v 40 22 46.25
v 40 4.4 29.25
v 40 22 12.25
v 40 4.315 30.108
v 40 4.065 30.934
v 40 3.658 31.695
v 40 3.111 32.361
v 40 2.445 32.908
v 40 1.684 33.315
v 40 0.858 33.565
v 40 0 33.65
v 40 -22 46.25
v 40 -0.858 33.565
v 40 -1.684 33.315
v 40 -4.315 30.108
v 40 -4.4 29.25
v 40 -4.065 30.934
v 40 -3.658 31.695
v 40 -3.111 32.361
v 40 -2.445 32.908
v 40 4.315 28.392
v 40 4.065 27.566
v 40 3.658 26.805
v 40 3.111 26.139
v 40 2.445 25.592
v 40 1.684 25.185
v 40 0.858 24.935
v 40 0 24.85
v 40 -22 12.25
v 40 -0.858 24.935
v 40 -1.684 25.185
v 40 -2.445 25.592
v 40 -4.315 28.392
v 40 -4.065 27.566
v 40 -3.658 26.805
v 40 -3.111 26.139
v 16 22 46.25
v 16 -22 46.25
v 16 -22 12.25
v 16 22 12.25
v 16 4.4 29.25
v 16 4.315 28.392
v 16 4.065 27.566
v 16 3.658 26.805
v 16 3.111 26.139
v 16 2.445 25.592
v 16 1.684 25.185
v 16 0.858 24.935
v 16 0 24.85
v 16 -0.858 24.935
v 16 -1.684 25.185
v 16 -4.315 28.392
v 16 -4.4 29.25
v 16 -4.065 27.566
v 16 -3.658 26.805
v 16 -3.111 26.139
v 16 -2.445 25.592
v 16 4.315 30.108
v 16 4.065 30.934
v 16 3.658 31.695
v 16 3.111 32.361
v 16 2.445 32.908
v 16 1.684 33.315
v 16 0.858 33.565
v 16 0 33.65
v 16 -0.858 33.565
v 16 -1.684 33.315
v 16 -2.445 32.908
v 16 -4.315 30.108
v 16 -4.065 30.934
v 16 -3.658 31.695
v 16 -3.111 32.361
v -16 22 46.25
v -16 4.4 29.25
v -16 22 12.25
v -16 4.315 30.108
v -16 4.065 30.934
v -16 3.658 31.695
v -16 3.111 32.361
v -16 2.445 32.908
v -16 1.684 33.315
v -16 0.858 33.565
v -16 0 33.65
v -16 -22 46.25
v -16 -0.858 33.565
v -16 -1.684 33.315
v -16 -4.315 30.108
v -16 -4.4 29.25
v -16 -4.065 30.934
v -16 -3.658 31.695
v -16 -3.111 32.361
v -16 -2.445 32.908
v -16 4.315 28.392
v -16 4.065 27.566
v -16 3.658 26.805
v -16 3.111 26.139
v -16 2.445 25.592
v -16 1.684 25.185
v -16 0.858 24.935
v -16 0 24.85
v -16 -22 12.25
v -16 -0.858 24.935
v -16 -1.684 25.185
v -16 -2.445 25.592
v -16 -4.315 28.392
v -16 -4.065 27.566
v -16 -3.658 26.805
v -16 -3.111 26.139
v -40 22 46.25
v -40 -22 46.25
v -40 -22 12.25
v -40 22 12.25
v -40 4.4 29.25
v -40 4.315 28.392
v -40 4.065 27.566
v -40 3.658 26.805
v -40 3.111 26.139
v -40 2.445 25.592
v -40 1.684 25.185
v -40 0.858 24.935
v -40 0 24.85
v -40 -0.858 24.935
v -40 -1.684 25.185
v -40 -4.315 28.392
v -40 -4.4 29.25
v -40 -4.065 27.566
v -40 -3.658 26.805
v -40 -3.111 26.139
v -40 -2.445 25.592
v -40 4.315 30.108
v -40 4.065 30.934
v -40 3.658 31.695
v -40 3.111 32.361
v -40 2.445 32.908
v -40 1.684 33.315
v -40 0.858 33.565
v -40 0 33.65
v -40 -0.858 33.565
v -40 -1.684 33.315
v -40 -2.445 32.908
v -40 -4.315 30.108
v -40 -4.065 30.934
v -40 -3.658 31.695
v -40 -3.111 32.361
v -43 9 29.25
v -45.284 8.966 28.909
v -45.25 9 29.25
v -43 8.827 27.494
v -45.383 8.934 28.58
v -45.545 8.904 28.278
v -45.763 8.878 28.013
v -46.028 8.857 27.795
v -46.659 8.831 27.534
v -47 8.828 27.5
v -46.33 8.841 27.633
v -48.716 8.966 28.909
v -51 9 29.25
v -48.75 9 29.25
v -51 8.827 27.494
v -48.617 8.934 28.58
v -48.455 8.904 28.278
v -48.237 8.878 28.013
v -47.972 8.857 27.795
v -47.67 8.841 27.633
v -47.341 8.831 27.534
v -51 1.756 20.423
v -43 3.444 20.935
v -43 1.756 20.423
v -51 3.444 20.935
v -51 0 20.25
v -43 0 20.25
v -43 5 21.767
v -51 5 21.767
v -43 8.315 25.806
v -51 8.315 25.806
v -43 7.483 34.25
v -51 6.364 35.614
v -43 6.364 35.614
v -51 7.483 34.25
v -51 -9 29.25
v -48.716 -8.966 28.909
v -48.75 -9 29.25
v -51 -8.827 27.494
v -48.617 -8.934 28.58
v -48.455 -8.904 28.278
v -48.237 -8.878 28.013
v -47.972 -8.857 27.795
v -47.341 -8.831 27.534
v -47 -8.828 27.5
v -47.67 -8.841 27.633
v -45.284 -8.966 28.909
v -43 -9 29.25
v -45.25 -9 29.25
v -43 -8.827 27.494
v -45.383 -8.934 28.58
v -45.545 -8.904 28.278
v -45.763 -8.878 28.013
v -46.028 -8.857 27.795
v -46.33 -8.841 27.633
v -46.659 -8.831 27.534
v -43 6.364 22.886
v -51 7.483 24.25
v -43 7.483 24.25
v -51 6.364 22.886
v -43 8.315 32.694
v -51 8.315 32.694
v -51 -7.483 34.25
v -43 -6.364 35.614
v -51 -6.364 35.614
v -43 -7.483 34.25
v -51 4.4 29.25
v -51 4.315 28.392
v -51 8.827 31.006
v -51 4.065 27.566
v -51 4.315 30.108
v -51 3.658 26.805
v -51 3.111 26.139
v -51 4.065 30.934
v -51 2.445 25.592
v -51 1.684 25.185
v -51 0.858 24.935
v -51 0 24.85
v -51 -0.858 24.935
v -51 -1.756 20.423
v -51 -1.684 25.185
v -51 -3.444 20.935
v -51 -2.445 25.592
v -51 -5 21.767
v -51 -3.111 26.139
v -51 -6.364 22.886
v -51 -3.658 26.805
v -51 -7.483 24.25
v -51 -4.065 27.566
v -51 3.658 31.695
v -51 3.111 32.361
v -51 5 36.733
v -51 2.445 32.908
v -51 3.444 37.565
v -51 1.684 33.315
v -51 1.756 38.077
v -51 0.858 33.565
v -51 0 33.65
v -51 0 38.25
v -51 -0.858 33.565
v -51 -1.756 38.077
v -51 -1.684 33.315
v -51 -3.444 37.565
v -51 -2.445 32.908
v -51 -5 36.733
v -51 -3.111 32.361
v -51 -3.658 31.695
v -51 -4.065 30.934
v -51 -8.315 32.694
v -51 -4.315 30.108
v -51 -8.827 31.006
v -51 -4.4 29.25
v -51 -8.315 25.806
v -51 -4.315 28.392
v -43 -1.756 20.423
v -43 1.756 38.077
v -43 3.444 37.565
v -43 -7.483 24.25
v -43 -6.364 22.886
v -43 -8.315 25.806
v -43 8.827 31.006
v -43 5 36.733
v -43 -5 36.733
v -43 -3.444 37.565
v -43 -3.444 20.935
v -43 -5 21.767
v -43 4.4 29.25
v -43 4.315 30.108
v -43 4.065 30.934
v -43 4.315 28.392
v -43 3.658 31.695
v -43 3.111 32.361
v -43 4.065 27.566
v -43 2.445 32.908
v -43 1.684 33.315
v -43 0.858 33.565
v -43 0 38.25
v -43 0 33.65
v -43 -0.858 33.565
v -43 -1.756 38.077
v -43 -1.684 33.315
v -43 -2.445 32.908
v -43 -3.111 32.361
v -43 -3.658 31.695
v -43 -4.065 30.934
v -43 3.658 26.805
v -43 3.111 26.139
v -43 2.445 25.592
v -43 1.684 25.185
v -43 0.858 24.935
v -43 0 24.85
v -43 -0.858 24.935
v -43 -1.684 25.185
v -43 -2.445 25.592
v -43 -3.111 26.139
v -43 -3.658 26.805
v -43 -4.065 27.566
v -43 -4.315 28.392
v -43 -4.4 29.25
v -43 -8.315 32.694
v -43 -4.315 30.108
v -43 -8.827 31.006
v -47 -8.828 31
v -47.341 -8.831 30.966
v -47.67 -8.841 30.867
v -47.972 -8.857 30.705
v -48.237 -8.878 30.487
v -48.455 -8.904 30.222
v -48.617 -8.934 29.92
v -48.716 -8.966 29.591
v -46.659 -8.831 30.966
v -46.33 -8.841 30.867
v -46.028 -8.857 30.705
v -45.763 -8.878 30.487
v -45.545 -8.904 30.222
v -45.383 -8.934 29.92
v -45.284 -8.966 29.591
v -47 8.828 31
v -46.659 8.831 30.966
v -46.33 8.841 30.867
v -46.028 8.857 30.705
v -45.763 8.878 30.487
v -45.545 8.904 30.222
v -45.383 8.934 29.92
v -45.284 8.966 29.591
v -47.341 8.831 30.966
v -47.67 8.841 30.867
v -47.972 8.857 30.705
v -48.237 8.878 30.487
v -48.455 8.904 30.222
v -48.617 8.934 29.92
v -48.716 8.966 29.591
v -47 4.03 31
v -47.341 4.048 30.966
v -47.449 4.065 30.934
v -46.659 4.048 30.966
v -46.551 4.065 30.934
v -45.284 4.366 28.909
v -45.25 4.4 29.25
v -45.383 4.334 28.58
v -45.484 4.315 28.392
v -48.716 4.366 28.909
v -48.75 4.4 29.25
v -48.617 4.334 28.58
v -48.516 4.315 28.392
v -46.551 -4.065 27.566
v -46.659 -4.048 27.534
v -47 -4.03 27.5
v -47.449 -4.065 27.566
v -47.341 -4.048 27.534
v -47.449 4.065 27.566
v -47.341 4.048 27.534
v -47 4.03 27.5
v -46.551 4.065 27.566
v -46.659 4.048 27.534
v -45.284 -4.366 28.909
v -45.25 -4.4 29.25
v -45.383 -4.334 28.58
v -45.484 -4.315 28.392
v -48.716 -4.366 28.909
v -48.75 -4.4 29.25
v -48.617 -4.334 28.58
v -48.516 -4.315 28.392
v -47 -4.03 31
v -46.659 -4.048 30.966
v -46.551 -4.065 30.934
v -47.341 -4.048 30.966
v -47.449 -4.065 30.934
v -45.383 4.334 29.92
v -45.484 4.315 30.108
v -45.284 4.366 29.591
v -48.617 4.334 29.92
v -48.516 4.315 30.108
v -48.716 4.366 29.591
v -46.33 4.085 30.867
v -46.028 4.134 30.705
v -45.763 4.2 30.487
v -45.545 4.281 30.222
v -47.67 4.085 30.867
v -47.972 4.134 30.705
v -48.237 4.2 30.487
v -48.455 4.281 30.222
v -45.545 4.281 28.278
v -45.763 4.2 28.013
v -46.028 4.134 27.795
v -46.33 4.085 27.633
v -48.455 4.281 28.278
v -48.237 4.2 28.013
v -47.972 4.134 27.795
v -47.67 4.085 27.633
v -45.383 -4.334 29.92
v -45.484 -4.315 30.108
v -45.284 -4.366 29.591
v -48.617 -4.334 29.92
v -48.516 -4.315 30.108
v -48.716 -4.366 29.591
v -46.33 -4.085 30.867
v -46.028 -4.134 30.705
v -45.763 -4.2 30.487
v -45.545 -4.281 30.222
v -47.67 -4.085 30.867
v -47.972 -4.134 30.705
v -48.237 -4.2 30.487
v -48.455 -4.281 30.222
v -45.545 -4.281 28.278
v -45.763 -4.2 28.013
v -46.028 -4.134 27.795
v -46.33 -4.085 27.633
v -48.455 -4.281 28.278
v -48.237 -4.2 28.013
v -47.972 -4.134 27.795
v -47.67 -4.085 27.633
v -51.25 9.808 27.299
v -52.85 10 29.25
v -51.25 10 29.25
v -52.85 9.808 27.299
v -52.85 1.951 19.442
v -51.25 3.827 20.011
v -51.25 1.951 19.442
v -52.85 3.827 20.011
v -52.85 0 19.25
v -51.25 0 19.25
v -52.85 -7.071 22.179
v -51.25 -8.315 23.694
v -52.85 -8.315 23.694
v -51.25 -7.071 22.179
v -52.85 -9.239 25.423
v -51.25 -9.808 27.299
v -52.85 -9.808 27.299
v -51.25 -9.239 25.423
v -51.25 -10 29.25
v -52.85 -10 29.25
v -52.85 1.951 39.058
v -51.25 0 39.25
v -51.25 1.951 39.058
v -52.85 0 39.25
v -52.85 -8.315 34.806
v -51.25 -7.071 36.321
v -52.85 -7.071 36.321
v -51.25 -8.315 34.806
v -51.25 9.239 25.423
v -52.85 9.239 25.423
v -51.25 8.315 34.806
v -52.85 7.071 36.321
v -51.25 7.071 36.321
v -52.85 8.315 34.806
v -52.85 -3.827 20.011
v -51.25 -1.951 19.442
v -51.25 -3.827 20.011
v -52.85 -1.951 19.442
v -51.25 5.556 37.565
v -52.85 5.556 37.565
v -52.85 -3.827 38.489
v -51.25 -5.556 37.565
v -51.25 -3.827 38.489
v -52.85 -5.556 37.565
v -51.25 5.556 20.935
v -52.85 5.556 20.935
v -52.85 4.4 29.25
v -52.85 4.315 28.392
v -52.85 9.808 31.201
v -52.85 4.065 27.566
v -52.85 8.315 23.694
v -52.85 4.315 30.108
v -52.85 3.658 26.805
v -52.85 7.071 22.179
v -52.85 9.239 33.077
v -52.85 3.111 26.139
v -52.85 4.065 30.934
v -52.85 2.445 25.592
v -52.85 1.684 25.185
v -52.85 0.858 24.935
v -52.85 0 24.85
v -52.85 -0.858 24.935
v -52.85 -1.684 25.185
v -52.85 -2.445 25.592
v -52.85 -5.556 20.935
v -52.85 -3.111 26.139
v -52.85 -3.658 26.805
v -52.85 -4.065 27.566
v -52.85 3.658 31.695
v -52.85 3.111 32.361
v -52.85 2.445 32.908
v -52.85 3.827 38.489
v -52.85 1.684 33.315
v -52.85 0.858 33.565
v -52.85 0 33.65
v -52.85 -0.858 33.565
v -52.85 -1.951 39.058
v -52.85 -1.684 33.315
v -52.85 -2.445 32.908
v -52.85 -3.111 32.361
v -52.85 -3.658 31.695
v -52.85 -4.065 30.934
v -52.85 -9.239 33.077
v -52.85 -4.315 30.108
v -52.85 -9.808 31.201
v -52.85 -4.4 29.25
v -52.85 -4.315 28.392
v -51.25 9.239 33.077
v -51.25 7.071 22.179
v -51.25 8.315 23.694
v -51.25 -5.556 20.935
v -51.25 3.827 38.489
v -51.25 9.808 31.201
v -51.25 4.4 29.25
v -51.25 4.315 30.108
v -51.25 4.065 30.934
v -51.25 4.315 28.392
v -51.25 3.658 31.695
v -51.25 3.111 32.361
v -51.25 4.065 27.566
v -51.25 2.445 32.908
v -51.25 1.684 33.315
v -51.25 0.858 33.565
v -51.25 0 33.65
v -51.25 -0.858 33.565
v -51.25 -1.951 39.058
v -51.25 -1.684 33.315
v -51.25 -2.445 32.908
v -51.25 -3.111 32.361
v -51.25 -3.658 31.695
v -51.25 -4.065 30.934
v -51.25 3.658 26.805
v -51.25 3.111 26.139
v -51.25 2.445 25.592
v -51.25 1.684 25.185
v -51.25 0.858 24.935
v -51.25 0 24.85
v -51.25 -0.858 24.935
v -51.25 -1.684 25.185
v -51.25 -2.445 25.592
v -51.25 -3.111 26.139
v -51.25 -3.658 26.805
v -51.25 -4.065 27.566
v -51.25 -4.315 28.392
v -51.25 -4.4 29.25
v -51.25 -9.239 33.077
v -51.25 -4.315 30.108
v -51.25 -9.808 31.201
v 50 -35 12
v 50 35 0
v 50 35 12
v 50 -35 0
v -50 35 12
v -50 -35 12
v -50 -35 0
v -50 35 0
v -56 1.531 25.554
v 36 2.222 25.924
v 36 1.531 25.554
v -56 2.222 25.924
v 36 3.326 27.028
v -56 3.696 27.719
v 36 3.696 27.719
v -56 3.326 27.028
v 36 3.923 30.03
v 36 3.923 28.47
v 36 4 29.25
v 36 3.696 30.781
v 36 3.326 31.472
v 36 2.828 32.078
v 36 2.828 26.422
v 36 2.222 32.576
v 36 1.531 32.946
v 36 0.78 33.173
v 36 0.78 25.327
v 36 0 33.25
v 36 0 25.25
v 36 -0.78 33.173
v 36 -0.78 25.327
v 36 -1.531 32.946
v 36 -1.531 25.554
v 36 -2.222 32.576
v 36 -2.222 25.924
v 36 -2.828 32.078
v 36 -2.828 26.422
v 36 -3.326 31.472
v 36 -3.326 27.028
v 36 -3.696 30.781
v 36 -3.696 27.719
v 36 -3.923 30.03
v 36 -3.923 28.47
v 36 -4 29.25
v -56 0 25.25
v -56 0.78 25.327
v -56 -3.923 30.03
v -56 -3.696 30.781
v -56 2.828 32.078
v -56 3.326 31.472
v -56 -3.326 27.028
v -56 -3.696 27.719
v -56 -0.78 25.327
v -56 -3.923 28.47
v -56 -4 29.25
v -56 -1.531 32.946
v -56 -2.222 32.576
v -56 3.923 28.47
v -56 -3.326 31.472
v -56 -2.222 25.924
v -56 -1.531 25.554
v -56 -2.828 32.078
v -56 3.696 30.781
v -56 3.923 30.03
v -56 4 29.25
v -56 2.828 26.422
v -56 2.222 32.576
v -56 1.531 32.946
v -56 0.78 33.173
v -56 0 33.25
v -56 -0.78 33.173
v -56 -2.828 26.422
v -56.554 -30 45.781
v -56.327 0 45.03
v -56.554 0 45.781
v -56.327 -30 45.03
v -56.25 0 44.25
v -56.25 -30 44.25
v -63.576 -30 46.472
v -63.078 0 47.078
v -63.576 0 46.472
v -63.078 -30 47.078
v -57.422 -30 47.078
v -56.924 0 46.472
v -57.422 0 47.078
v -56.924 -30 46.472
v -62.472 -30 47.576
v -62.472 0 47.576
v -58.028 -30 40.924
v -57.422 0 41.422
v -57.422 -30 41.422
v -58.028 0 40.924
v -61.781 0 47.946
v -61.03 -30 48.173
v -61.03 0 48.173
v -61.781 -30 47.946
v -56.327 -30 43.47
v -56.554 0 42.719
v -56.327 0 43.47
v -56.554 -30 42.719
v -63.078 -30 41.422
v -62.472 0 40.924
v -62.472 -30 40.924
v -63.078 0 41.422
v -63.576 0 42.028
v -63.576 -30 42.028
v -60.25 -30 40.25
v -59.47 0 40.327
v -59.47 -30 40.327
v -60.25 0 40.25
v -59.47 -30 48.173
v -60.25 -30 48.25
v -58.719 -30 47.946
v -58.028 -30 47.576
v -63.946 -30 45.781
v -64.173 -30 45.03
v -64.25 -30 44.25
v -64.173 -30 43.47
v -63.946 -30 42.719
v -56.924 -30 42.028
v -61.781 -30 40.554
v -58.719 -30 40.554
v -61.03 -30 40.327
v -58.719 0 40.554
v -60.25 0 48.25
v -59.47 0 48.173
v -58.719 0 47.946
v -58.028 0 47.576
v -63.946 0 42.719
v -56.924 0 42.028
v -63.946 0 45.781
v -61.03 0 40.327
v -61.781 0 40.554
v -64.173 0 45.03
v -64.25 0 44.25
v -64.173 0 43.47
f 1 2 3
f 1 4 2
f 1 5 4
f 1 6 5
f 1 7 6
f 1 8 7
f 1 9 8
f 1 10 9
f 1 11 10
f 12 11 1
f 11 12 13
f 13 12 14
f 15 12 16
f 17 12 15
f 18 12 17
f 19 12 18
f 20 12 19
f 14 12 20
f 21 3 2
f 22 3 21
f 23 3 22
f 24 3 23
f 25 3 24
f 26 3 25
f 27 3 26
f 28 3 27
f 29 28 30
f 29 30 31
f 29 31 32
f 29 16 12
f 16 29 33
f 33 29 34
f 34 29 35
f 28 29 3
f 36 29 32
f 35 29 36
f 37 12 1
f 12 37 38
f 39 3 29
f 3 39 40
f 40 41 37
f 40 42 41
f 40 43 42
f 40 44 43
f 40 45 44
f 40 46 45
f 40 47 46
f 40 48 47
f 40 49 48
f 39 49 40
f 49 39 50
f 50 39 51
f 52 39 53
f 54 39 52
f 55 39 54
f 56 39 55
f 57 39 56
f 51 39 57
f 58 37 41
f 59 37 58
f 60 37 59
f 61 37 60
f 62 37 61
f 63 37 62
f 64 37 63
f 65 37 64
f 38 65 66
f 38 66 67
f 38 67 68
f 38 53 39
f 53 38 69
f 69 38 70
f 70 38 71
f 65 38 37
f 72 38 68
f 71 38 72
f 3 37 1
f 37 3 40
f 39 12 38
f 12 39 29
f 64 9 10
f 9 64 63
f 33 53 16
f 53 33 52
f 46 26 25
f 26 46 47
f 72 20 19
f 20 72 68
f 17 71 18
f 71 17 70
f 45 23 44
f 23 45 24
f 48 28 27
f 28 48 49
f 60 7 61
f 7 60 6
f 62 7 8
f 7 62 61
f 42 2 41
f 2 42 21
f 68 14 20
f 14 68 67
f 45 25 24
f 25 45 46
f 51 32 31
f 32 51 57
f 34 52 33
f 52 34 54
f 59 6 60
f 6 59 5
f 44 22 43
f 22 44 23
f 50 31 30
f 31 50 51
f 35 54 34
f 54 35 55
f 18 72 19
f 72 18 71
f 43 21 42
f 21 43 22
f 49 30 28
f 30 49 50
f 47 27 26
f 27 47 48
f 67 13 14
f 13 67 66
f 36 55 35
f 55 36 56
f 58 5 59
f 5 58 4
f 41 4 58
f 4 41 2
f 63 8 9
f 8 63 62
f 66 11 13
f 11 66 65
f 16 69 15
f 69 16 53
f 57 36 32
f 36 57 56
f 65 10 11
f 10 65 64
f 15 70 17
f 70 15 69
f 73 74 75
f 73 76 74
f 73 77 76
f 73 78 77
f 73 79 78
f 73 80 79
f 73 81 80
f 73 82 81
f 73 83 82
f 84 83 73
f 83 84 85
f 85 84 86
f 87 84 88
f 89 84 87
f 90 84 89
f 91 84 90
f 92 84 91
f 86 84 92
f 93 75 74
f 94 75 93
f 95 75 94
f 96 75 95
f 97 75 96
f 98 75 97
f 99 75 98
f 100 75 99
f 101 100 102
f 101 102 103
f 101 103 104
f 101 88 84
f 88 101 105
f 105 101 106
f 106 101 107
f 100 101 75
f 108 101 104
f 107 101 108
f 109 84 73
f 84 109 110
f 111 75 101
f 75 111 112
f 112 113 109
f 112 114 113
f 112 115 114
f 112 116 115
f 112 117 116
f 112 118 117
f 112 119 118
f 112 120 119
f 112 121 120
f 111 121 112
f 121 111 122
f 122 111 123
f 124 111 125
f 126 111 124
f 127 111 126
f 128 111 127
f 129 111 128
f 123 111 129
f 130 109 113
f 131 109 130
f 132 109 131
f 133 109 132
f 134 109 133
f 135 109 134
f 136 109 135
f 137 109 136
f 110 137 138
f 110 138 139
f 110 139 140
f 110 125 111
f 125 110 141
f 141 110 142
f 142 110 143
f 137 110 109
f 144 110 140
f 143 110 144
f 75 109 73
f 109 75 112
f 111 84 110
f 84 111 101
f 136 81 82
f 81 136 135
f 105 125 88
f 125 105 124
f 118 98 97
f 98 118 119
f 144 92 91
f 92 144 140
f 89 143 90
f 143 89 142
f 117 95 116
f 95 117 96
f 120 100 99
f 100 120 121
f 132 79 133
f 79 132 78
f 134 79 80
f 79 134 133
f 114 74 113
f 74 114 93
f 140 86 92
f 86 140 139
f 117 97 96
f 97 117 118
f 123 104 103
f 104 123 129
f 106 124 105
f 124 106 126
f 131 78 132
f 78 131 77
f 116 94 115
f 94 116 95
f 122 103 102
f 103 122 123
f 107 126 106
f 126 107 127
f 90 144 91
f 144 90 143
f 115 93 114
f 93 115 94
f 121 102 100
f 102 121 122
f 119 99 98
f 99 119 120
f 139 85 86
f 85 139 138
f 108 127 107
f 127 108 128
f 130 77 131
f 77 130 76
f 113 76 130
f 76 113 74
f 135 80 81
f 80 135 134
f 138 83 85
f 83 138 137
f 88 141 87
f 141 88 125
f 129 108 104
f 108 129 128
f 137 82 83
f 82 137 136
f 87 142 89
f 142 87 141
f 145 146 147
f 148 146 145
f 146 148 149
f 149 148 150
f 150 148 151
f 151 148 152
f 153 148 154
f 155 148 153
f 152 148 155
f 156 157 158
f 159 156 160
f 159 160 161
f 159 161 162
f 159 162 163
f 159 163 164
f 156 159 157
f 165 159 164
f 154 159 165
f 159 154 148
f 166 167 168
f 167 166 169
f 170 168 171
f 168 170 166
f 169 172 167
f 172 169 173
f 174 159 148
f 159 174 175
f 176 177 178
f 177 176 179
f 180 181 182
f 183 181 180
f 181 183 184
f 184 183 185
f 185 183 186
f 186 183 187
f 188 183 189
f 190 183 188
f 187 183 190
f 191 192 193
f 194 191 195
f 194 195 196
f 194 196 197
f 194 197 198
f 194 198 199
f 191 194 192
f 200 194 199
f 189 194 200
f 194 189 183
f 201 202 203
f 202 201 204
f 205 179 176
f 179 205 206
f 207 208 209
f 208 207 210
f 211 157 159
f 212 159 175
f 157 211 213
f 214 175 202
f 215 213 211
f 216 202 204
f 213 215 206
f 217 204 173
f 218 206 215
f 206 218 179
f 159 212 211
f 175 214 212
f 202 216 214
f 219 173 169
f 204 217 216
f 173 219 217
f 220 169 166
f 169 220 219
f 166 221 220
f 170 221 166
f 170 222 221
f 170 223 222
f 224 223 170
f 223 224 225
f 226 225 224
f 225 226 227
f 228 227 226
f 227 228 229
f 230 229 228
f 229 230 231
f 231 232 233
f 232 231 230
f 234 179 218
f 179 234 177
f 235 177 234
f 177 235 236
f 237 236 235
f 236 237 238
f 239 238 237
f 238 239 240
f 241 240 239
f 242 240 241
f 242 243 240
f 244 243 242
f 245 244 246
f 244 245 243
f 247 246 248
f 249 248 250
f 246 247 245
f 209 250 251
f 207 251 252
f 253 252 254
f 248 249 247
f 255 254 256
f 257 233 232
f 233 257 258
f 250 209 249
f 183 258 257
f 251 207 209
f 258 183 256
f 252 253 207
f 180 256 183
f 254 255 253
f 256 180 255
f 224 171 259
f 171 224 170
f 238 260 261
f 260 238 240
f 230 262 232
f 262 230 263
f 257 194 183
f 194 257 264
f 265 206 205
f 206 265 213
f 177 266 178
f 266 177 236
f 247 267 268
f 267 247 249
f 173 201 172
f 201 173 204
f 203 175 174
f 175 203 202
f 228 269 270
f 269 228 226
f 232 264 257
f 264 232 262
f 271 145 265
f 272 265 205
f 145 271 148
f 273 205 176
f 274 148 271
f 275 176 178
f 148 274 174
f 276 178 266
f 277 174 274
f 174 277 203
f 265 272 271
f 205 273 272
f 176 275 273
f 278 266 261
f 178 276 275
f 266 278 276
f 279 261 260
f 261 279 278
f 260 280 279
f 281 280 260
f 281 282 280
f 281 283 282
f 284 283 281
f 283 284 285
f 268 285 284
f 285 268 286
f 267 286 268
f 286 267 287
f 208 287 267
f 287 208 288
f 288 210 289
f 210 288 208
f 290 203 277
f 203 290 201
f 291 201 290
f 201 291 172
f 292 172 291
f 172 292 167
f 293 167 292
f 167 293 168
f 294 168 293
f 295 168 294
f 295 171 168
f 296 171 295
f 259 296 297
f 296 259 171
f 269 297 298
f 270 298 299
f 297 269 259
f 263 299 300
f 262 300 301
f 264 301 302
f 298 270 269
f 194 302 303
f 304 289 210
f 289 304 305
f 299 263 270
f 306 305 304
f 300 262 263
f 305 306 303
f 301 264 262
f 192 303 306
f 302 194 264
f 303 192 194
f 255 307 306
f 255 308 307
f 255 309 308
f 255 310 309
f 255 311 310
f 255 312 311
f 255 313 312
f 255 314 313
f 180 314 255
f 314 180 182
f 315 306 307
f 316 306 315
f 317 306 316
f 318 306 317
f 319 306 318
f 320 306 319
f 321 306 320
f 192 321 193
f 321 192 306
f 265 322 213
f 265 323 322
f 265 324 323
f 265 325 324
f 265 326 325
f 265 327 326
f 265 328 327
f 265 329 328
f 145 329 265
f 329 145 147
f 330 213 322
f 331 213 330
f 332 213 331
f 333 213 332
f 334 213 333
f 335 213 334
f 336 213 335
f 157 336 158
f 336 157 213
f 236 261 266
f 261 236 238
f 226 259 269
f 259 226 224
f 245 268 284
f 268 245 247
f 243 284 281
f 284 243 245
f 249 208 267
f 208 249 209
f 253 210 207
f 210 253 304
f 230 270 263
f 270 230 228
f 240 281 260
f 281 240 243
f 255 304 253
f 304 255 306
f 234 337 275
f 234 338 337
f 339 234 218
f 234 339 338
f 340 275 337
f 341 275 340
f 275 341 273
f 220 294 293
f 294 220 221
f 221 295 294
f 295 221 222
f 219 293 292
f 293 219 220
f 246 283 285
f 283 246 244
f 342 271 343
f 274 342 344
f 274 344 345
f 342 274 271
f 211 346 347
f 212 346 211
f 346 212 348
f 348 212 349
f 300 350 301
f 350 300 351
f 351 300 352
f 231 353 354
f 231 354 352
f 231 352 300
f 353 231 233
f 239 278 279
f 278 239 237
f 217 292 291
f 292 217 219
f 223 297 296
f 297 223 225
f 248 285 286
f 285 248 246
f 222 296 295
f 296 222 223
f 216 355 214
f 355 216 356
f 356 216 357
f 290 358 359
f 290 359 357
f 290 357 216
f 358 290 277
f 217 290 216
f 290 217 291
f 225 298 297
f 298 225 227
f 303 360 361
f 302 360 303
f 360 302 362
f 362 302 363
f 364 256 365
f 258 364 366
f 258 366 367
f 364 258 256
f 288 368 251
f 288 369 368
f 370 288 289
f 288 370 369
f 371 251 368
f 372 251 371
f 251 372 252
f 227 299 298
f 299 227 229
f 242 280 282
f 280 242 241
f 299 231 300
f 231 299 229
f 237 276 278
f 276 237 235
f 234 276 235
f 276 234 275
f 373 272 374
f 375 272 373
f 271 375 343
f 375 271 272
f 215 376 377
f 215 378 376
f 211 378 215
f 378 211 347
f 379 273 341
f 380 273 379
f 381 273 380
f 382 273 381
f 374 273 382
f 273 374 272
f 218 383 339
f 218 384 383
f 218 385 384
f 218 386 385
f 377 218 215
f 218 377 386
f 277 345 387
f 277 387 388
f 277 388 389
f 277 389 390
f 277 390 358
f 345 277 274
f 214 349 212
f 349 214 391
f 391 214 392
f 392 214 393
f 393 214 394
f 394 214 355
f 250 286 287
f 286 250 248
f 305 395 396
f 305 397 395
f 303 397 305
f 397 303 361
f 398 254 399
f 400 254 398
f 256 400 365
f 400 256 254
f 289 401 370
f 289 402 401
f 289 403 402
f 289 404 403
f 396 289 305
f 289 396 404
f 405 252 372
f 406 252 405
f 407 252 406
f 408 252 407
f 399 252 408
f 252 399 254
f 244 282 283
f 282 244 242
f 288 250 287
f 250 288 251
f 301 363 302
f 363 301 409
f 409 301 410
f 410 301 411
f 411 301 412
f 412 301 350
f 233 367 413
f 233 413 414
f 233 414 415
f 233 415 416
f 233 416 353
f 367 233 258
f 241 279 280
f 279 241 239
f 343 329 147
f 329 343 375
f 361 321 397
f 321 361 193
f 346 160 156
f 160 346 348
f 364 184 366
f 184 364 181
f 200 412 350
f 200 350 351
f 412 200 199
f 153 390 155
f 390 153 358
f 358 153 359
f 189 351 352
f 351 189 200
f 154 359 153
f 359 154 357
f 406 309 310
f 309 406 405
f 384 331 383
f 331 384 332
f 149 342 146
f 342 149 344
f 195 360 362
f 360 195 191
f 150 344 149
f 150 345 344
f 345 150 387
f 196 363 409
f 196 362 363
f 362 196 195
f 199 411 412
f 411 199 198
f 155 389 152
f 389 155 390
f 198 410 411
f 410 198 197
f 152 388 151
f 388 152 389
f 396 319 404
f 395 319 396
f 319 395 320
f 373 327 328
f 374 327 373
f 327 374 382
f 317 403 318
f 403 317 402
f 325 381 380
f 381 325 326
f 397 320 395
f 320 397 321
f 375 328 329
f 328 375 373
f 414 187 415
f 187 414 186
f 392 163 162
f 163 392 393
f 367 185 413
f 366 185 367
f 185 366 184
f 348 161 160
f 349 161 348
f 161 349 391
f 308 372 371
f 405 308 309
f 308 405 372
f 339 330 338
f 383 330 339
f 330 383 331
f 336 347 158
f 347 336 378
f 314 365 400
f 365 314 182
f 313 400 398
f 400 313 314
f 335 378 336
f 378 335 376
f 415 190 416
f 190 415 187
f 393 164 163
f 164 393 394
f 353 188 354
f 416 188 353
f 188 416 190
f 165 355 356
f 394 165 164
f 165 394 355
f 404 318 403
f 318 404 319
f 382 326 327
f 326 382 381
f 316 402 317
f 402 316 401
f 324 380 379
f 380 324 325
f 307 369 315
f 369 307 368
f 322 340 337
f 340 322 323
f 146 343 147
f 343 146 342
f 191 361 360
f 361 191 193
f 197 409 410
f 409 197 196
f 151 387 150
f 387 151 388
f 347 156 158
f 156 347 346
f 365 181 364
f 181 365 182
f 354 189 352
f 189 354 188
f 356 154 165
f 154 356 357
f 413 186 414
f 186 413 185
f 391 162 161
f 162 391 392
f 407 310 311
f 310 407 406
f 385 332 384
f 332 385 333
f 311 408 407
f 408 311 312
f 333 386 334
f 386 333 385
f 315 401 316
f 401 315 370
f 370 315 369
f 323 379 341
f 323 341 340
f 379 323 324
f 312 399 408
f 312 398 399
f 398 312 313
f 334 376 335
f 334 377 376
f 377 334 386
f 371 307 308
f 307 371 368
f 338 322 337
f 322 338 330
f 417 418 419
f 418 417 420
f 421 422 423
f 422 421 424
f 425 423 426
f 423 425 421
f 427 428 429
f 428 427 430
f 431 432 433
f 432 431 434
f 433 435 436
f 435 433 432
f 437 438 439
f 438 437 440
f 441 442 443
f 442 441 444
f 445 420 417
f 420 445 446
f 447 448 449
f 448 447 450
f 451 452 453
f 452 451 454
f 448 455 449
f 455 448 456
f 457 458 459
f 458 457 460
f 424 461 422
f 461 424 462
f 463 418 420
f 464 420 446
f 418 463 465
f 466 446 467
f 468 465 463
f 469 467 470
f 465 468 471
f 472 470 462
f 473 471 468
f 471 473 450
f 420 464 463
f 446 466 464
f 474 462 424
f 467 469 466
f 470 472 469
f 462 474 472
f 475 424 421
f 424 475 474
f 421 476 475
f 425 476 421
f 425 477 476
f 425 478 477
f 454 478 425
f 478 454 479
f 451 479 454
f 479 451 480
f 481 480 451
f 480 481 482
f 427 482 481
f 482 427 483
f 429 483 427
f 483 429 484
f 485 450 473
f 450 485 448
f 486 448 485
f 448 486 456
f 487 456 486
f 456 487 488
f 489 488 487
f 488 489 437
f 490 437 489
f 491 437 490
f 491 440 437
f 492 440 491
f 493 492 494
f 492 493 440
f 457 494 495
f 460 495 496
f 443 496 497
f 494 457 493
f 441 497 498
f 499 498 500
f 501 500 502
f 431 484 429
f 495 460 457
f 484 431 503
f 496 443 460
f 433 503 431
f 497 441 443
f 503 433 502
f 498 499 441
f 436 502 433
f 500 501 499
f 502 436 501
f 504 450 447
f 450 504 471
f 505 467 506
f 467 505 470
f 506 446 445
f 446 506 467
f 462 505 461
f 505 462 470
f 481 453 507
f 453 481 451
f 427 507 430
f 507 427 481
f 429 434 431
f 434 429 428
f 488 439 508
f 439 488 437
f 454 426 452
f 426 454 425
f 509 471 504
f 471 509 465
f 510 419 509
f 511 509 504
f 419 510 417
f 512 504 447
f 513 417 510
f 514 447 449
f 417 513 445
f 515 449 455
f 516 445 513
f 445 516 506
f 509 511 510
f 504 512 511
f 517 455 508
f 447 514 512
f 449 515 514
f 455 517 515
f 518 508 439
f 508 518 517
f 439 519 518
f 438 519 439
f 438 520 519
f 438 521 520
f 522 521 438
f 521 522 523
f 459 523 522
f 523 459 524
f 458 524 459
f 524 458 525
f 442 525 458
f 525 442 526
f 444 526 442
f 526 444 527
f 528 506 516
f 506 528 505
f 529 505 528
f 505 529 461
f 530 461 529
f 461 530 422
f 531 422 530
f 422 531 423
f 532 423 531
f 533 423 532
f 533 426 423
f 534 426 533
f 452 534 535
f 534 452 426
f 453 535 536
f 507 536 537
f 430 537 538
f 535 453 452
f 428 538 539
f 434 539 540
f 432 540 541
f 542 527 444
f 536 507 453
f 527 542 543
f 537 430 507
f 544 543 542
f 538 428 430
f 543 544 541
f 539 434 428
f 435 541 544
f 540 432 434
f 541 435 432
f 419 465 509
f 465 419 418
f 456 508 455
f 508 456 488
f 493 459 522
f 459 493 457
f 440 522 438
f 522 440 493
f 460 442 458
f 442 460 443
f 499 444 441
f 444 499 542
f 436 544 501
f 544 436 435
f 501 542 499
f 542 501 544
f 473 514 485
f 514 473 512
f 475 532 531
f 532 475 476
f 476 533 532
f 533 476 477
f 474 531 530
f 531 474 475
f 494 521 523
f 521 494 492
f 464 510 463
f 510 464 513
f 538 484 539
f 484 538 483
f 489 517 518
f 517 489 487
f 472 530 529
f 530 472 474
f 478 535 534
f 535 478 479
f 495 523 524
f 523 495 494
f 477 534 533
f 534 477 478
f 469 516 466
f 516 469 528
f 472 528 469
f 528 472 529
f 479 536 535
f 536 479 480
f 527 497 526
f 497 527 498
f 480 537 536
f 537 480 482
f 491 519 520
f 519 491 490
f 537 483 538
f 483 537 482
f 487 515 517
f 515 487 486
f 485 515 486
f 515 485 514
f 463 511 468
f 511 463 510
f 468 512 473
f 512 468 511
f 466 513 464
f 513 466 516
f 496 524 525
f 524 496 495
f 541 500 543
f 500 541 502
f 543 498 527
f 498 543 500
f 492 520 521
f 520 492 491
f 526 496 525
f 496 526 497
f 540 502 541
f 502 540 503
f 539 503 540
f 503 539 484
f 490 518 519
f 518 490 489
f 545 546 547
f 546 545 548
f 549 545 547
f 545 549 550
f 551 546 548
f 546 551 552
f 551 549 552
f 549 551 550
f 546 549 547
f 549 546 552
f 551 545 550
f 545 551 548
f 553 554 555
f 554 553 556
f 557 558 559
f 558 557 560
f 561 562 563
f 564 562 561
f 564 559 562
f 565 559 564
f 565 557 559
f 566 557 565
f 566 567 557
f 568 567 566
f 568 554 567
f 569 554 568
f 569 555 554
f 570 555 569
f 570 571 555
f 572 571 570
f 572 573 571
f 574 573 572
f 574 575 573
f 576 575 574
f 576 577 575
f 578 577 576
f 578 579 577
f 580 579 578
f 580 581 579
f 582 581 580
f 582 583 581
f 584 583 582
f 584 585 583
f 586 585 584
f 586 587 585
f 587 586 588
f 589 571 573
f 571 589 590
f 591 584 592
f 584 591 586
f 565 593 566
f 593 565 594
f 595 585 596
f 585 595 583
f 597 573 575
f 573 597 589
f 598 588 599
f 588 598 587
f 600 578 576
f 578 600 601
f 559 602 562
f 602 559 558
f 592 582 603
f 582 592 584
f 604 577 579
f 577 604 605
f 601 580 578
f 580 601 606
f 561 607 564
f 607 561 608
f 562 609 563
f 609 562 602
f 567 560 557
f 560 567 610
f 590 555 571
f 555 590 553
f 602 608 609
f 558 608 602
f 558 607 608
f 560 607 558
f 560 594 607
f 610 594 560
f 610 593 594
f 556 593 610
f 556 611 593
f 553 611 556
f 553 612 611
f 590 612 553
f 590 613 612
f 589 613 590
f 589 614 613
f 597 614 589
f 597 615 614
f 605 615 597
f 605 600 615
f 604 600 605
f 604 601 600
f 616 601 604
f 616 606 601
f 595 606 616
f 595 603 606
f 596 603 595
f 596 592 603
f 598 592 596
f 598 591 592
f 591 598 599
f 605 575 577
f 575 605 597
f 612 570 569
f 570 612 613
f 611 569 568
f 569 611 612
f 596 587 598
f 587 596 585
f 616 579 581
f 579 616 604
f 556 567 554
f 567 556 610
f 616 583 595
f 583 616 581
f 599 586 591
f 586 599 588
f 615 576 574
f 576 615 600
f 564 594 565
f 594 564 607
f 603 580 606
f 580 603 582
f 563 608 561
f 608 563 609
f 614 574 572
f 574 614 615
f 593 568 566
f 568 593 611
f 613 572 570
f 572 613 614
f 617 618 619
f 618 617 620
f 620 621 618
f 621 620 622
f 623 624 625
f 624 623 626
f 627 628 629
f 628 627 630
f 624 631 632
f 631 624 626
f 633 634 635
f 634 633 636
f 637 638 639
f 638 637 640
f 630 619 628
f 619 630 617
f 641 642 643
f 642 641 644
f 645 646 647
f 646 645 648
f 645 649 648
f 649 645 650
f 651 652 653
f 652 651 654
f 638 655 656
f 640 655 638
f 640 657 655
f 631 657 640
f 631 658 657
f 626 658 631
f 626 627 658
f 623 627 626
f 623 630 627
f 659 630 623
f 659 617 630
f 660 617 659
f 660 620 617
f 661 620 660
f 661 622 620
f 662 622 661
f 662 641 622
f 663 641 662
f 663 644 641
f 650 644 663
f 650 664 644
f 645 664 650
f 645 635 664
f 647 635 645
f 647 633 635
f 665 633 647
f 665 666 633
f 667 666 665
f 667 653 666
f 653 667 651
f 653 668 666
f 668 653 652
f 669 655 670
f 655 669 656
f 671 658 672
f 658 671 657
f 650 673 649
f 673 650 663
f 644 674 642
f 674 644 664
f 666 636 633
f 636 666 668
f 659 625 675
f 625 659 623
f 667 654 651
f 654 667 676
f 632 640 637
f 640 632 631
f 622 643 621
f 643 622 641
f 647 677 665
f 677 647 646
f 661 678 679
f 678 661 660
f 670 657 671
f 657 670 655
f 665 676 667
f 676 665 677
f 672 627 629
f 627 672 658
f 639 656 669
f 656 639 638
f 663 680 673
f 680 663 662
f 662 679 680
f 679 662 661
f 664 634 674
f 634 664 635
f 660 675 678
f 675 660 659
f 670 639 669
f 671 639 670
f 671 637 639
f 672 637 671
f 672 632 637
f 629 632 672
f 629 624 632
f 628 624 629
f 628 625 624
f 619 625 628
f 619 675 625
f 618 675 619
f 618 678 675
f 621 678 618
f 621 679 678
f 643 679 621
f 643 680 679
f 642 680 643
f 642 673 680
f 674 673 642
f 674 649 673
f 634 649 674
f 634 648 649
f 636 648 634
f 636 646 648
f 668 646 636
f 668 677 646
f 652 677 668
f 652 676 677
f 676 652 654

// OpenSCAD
$fn = 32;

// ------------------------------------------------------------------------
// Machine vise: screw d8, jaws 24 x 34 mm
// Every part is its own module, assembly() places every instance.
// ------------------------------------------------------------------------

// --- part 1 ---
module vise_bed() {
  difference() {
    translate([-50, -35, 0]) cube([100, 70, 12]);
  }
}

// --- part 2 ---
module vise_jaw() {
  difference() {
    translate([-12, -22, 0]) cube([24, 44, 34]);
    translate([0, 0, 17]) rotate([0, 90, 0]) cylinder(h = 26, d = 8.8, center = true);
  }
}

// --- part 3 ---
module vise_screw() {
  translate([0, 0, -46]) cylinder(h = 92, d = 8);
}

// --- part 4 ---
module screw_collar() {
  difference() {
    cylinder(h = 8, d = 18);
    translate([0, 0, -1]) cylinder(h = 10, d = 8.8);
    translate([0, 0, 4]) rotate([90, 0, 0]) cylinder(h = 20, d = 3.5, center = true);
  }
}

// --- part 5 ---
module screw_washer() {
  difference() {
      translate([0, 0, 0]) cylinder(h = 1.6, d = 20);
      translate([0, 0, -1]) cylinder(h = 3.6, d = 8.8);
    }
}

// --- part 6 ---
module vise_handle() {
  cylinder(h = 30, d = 8);
}

// --- assembly ---
module assembly() {
  color([0.80, 0.24, 0.20]) translate([0, 0, 0]) rotate([0, 0, 0]) vise_bed();
  color([0.20, 0.45, 0.75]) translate([28, 0, 12.25]) rotate([0, 0, 0]) vise_jaw();
  color([0.25, 0.62, 0.32]) translate([-28, 0, 12.25]) rotate([0, 0, 0]) vise_jaw();
  color([0.92, 0.70, 0.18]) translate([-10, 0, 29.25]) rotate([0, 90, 0]) vise_screw();
  color([0.58, 0.35, 0.70]) translate([-51, 0, 29.25]) rotate([0, 90, 0]) screw_collar();
  color([0.16, 0.66, 0.66]) translate([-52.85, 0, 29.25]) rotate([0, 90, 0]) screw_washer();
  color([0.85, 0.48, 0.18]) translate([-60.25, 0, 44.25]) rotate([90, 0, 0]) vise_handle();
}

assembly();
